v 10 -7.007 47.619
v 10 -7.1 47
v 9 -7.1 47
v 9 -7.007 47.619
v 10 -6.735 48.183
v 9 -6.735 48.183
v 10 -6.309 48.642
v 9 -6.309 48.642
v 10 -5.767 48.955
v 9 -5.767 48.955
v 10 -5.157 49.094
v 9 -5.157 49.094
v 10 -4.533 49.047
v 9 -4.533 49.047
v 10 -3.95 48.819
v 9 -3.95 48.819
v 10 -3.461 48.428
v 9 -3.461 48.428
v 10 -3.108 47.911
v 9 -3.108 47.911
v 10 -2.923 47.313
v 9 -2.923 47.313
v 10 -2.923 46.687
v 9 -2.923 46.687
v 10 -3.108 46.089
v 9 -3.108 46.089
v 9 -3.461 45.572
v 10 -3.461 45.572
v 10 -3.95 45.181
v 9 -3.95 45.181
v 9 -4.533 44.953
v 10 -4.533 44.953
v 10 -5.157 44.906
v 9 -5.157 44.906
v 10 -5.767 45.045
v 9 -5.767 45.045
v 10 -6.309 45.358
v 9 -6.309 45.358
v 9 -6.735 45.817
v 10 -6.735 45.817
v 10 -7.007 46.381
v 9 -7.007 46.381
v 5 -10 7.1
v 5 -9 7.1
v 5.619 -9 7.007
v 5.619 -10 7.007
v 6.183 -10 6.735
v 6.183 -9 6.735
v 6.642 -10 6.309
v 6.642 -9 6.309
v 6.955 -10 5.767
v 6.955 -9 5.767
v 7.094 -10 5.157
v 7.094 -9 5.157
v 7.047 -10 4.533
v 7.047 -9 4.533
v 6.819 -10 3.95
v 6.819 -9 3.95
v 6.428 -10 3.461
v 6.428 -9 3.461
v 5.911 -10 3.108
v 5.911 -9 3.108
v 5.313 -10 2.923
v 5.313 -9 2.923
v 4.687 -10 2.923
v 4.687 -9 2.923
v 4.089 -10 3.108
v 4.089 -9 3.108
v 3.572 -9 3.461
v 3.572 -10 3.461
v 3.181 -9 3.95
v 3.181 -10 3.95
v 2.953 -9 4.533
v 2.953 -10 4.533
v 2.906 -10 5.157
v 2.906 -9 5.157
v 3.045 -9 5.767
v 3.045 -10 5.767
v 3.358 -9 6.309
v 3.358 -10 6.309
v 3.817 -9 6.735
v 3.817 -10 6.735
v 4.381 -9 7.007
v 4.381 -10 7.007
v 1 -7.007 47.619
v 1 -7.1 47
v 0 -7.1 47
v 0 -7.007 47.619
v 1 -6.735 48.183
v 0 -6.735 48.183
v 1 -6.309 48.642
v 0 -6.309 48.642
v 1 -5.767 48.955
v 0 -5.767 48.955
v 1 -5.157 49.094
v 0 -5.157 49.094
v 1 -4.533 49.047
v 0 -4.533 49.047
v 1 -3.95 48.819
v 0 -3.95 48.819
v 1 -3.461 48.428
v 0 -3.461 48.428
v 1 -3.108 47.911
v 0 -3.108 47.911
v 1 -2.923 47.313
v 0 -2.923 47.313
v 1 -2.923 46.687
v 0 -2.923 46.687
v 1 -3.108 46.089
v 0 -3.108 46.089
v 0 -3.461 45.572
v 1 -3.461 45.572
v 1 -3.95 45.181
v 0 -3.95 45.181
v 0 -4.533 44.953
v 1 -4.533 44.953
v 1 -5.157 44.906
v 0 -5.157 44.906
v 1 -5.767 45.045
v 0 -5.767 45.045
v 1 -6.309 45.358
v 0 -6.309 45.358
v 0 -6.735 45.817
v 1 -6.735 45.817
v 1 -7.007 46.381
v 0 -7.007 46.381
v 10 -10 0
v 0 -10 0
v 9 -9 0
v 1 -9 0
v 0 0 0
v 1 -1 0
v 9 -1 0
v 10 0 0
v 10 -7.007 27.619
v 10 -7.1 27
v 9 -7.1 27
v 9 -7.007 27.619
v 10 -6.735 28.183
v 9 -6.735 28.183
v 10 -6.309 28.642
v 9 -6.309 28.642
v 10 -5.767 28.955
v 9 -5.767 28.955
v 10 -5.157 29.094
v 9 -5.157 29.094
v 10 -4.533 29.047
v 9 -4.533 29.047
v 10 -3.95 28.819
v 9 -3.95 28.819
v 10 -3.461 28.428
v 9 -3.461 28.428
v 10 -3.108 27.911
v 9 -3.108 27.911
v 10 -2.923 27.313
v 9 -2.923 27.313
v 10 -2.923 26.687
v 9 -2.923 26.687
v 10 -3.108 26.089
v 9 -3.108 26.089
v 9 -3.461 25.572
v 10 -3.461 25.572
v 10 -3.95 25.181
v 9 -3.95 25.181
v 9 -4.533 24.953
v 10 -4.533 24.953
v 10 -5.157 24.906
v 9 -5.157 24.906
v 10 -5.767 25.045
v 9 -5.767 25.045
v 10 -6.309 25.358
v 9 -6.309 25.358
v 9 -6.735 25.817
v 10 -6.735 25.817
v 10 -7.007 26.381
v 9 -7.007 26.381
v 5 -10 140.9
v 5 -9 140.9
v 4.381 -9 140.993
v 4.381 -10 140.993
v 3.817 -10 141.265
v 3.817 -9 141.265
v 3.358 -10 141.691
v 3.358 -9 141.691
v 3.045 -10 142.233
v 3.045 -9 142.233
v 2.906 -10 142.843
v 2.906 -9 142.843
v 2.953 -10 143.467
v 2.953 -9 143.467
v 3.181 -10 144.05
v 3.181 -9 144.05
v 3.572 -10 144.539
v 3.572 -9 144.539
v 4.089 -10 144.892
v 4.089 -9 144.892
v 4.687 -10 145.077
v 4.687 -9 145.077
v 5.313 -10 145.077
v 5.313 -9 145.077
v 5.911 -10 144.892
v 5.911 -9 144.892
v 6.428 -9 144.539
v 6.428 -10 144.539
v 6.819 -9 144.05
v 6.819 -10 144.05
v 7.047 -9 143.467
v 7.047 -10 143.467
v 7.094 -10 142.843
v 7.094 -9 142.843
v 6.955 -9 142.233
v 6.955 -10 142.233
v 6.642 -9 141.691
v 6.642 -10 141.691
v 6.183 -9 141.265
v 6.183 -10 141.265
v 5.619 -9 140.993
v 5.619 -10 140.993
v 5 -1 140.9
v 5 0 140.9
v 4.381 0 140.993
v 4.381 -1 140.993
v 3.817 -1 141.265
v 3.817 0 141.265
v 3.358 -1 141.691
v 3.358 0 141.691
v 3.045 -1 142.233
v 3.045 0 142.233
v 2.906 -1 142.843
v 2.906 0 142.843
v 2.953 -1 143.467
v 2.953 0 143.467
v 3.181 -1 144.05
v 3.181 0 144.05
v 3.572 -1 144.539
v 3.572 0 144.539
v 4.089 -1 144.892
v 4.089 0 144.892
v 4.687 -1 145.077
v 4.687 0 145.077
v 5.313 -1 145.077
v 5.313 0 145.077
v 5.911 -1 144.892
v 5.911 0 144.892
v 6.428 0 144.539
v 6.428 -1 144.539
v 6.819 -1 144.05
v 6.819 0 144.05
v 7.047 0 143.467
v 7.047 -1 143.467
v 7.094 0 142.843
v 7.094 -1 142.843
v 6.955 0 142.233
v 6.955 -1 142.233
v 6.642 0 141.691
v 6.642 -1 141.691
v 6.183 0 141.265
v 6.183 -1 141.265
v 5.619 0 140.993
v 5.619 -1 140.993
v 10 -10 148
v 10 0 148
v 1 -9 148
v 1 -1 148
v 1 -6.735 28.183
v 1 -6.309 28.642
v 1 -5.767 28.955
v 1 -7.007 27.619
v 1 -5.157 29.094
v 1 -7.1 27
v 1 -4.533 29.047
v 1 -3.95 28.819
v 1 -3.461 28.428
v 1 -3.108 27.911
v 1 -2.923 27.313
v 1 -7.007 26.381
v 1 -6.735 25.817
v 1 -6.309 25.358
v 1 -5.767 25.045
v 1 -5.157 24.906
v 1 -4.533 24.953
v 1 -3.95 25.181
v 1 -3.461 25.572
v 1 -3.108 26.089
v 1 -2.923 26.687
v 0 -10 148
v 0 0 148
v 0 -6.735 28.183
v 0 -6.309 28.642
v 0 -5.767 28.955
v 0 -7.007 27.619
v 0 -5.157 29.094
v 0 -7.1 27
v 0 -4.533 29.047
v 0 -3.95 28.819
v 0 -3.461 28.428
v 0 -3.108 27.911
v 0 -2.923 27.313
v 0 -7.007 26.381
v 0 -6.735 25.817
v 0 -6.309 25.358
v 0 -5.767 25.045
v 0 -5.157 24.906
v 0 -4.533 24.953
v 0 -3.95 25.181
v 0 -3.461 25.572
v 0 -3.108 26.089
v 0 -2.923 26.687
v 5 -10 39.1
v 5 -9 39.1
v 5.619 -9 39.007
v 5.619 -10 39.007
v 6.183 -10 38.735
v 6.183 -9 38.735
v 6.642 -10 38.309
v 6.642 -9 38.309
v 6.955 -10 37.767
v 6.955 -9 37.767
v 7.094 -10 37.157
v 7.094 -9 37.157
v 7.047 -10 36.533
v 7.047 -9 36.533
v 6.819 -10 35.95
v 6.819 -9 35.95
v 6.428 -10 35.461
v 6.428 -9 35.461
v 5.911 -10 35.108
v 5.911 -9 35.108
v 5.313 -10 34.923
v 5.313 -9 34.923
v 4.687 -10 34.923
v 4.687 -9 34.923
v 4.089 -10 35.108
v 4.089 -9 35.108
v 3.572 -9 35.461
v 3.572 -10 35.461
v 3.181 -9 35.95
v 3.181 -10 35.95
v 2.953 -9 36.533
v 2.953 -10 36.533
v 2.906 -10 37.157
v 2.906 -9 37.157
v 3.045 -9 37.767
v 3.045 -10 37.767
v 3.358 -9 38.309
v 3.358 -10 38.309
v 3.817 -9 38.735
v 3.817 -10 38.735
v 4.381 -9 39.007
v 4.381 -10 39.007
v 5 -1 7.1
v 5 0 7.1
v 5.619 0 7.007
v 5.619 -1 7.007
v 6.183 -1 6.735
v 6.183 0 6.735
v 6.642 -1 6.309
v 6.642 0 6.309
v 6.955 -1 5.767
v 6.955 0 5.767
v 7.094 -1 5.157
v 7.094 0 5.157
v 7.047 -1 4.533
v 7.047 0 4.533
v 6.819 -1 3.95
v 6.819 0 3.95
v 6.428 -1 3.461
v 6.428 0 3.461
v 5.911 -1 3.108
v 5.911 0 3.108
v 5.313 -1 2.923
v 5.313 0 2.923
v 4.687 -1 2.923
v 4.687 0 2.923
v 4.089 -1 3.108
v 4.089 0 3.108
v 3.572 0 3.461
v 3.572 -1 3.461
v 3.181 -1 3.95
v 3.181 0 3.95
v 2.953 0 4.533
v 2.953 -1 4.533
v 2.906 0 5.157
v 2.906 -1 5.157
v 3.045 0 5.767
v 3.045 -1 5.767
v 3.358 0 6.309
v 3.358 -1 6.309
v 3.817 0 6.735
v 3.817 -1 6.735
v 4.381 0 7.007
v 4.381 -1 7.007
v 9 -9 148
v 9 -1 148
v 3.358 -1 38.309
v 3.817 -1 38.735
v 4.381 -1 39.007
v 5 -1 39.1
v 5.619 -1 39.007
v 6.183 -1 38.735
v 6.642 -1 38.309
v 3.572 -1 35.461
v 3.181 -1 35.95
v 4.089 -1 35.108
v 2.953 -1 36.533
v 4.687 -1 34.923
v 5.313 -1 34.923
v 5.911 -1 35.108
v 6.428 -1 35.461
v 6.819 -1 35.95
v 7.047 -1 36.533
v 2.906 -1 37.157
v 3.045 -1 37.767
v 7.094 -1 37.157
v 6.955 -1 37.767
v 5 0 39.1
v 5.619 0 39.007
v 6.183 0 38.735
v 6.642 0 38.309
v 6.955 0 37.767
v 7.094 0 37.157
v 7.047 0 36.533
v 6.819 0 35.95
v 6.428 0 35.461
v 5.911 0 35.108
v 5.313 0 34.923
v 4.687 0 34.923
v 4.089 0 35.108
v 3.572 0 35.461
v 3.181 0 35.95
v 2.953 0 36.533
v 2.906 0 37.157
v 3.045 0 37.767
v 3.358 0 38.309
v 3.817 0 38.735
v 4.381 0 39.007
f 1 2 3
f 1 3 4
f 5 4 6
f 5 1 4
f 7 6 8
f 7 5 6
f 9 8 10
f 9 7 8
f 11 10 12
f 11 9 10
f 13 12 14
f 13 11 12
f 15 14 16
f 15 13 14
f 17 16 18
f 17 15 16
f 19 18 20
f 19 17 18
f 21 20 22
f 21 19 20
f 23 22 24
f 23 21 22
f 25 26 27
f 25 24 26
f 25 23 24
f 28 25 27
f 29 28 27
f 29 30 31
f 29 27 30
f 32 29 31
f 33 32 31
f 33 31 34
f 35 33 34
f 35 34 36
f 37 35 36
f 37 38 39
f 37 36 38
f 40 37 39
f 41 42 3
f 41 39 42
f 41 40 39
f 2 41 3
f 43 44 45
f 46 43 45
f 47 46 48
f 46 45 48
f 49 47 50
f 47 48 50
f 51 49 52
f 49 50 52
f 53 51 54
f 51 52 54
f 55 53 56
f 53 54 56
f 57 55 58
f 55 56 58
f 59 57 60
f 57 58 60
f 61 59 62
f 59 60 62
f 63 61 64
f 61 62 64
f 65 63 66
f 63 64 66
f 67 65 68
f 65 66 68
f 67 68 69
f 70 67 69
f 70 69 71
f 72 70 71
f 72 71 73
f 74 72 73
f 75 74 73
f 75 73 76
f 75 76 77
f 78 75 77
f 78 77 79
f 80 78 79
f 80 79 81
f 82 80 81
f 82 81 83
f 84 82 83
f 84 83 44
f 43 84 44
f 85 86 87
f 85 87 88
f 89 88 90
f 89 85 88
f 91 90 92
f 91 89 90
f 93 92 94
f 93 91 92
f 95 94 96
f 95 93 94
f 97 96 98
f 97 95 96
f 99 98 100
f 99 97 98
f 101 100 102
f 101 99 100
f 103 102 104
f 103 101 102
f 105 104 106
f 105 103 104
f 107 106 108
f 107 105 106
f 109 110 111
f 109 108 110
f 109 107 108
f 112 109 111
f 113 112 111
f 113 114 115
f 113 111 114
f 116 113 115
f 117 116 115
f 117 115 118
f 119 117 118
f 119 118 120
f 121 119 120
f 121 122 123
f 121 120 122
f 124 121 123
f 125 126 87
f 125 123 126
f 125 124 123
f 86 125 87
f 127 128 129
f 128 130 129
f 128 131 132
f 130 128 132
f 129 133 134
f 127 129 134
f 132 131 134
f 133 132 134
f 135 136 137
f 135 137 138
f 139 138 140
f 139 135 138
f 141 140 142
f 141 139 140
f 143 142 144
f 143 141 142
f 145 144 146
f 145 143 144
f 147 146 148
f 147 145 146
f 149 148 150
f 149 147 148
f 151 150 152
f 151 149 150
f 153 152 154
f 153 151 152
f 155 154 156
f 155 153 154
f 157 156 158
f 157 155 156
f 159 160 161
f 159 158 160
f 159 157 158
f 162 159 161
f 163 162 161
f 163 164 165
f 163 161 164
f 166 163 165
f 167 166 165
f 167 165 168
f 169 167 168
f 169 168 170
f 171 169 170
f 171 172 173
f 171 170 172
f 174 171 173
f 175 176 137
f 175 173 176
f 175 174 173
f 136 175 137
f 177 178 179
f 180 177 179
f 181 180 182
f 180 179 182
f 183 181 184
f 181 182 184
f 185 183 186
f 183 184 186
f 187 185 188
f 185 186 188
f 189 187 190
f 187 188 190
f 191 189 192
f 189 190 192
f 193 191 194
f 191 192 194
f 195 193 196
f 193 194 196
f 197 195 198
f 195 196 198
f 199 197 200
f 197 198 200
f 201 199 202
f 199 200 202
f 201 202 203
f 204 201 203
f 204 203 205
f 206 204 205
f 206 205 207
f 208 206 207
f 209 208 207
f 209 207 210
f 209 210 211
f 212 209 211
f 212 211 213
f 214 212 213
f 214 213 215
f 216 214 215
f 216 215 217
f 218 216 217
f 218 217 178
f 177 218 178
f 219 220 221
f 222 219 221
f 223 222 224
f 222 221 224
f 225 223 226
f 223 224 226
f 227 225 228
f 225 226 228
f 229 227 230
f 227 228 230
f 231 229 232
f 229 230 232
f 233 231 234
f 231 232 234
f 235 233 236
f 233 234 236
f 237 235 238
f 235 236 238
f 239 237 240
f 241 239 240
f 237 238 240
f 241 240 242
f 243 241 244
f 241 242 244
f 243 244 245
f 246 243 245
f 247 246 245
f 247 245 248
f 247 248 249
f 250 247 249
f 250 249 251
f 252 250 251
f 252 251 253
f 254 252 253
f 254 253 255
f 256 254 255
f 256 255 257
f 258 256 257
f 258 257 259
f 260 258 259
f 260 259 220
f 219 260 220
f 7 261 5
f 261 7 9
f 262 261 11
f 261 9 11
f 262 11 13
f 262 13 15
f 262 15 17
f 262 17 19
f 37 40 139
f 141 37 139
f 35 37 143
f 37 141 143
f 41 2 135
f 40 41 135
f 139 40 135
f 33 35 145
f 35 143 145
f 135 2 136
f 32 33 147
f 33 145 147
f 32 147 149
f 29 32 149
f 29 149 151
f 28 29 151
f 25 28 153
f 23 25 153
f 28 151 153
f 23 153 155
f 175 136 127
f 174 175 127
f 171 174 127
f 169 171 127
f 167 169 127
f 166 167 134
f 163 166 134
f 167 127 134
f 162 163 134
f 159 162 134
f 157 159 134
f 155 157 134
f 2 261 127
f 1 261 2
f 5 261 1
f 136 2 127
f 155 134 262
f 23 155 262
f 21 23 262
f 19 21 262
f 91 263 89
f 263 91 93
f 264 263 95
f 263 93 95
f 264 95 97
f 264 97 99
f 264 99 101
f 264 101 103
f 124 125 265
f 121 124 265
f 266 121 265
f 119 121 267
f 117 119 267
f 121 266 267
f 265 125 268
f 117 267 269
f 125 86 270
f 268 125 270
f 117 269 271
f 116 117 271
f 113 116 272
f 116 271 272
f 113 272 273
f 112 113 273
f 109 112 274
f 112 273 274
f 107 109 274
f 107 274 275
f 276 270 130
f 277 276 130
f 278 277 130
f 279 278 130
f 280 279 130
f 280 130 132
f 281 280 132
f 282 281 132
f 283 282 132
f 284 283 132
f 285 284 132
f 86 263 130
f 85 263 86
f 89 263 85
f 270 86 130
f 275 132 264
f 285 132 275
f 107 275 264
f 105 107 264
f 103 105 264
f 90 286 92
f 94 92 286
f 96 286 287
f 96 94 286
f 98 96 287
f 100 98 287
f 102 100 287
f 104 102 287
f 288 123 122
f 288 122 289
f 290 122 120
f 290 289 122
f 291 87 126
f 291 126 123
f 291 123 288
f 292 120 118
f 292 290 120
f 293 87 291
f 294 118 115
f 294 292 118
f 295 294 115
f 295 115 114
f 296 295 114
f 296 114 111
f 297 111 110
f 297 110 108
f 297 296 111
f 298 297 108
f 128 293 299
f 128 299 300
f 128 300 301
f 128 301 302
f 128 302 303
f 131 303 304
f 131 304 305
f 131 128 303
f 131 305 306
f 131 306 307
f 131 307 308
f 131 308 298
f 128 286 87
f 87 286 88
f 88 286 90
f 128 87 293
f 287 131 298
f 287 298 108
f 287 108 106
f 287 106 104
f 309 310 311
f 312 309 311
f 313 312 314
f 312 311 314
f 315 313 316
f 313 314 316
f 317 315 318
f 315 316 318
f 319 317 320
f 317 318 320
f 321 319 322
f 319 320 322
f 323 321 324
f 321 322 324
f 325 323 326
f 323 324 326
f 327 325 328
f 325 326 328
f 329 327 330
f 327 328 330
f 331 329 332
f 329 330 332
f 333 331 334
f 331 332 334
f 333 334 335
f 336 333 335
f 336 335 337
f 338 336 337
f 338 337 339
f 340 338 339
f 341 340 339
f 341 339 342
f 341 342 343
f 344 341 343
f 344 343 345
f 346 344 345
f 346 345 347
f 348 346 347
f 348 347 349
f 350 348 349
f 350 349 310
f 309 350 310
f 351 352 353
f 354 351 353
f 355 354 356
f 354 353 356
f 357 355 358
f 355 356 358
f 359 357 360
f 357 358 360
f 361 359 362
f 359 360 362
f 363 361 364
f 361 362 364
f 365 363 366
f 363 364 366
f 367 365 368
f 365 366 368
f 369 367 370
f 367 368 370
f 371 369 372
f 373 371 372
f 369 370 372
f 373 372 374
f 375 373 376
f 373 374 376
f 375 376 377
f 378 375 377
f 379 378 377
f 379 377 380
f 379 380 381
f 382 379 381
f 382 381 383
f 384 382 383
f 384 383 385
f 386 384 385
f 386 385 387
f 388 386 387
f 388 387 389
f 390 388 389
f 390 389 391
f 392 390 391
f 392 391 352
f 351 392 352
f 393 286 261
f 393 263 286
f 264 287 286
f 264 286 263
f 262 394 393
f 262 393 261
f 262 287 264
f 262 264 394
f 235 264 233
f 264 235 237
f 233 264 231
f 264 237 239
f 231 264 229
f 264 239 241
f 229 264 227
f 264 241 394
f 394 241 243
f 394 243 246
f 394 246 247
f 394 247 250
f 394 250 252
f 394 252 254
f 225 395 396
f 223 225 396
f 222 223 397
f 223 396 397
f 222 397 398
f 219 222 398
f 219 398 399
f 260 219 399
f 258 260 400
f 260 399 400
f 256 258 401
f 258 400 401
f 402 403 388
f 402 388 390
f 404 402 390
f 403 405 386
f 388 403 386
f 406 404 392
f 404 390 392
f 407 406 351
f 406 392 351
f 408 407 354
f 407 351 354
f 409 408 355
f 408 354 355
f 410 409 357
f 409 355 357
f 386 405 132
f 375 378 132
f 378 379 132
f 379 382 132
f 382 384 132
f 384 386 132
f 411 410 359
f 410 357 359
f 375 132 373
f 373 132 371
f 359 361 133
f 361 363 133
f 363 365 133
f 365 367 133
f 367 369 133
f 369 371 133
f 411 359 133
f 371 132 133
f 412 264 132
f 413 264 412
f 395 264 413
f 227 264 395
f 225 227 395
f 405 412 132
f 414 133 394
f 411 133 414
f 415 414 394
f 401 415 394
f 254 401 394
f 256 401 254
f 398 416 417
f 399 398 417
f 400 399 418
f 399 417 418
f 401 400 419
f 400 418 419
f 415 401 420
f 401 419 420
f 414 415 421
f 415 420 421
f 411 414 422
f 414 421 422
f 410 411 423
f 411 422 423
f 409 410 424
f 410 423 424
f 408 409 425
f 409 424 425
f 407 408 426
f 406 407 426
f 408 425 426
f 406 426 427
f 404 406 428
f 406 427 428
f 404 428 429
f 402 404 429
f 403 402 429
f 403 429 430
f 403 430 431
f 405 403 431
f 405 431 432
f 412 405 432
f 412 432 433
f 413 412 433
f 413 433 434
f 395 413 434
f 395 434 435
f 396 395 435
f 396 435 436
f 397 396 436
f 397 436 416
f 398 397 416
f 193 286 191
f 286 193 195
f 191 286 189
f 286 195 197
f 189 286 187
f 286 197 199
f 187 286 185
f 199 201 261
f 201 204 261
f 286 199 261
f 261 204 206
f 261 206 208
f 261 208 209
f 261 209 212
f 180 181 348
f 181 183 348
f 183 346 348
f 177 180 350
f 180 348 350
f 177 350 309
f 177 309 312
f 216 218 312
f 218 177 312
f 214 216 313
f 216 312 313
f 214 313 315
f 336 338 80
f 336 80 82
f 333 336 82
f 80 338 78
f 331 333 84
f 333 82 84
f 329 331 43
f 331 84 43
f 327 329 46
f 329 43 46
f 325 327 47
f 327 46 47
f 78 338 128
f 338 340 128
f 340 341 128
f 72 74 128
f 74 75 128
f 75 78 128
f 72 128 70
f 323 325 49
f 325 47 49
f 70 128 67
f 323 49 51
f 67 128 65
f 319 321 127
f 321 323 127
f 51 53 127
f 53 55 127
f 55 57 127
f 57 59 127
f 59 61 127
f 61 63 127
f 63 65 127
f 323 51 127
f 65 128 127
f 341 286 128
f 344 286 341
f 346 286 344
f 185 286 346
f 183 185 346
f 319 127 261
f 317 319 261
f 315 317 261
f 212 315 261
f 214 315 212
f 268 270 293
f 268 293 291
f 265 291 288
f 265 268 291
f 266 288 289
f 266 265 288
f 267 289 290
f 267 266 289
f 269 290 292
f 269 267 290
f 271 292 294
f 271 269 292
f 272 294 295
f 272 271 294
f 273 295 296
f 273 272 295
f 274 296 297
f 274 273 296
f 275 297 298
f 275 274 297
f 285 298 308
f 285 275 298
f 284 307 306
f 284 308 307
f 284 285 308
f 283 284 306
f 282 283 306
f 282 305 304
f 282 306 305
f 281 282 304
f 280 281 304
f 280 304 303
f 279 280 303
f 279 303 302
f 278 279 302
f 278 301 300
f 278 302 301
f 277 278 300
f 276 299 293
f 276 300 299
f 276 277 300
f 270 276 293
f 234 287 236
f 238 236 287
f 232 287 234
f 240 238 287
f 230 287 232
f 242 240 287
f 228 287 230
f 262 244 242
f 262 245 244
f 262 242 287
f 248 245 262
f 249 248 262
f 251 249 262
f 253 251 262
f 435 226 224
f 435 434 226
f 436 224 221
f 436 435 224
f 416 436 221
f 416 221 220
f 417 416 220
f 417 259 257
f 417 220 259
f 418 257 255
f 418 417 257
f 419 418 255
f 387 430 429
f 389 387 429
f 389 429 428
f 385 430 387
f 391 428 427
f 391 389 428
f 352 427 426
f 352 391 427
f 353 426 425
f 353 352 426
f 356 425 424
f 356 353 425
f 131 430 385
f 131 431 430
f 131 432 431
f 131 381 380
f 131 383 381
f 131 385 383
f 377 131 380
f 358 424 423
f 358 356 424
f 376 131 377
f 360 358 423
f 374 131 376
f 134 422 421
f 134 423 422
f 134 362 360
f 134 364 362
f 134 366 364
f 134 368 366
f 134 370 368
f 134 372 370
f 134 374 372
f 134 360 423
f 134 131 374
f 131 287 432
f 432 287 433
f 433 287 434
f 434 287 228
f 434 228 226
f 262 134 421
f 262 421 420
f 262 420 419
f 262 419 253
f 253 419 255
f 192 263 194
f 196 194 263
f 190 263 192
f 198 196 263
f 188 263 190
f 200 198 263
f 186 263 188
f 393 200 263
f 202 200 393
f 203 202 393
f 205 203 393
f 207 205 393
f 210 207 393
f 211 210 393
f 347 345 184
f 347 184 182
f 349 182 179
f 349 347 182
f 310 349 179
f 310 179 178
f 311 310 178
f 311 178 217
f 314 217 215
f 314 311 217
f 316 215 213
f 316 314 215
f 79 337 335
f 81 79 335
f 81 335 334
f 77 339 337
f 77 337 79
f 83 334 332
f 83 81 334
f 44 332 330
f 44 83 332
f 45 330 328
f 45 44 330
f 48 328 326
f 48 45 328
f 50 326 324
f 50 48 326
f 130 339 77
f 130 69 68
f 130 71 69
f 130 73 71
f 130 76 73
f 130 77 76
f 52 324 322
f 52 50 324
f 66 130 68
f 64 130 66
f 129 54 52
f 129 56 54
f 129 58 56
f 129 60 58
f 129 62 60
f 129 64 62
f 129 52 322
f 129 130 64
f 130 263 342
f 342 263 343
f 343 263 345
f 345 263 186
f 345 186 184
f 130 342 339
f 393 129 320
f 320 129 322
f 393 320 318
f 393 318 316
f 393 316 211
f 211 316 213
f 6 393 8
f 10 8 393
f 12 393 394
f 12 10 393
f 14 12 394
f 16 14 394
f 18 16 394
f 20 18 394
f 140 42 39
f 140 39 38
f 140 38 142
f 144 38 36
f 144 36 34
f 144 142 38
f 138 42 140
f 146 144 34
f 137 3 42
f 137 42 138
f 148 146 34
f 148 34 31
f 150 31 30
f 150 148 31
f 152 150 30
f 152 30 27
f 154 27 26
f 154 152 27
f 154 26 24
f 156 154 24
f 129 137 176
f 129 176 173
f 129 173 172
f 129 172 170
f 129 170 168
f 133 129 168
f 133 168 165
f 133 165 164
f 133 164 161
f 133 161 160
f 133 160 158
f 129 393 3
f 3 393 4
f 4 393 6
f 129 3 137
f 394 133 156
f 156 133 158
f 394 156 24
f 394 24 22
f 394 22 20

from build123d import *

# Parameters (mm, degrees)
SKETCH_1_W               = 10
SKETCH_1_H               = 10
SKETCH_1_W_2             = 8
SKETCH_1_H_2             = 8
EXTRUDE_1_DEPTH          = 148
CUT_EXTRUDE_1_DEPTH      = 149.67414032
CUT_EXTRUDE_1_DEPTH_BACK = 149.67414032
SKETCH_2_R               = 2.1
SKETCH_3_R               = 2.1
CUT_EXTRUDE_2_DEPTH      = 149.67414032


with BuildPart() as part:
    # 草图1 → 拉伸-薄壁1 (new body)
    with BuildSketch(Plane.XY):
        with Locations((5, -5)):
            Rectangle(SKETCH_1_W, SKETCH_1_H)
        with Locations((5, -5)):
            Rectangle(SKETCH_1_W_2, SKETCH_1_H_2, mode=Mode.SUBTRACT)
    extrude(amount=EXTRUDE_1_DEPTH)

    # 草图2 → 切除-拉伸1 (cut, two sides: drawn at the far end of the back side and taken through both)
    with BuildSketch(Plane.ZY.offset(-CUT_EXTRUDE_1_DEPTH_BACK)):
        with Locations(Location((27, -5, 0), (0, 0, 270))):
            Circle(SKETCH_2_R)
        with Locations(Location((47, -5, 0), (0, 0, 270))):
            Circle(SKETCH_2_R)
    extrude(amount=CUT_EXTRUDE_1_DEPTH + CUT_EXTRUDE_1_DEPTH_BACK, mode=Mode.SUBTRACT)

    # 草图3 → 切除-拉伸2 (cut, through all)
    with BuildSketch(Plane(origin=(0, 0, 0), x_dir=(1, 0, 0), z_dir=(0, 1, 0))):
        with Locations(Location((5, -5, 0), (0, 0, 270))):
            Circle(SKETCH_3_R)
        with Locations(Location((5, -143, 0), (0, 0, 90))):
            Circle(SKETCH_3_R)
        with Locations(Location((5, -37, 0), (0, 0, 270))):
            Circle(SKETCH_3_R)
    extrude(amount=-CUT_EXTRUDE_2_DEPTH, mode=Mode.SUBTRACT)


solid = part.part
